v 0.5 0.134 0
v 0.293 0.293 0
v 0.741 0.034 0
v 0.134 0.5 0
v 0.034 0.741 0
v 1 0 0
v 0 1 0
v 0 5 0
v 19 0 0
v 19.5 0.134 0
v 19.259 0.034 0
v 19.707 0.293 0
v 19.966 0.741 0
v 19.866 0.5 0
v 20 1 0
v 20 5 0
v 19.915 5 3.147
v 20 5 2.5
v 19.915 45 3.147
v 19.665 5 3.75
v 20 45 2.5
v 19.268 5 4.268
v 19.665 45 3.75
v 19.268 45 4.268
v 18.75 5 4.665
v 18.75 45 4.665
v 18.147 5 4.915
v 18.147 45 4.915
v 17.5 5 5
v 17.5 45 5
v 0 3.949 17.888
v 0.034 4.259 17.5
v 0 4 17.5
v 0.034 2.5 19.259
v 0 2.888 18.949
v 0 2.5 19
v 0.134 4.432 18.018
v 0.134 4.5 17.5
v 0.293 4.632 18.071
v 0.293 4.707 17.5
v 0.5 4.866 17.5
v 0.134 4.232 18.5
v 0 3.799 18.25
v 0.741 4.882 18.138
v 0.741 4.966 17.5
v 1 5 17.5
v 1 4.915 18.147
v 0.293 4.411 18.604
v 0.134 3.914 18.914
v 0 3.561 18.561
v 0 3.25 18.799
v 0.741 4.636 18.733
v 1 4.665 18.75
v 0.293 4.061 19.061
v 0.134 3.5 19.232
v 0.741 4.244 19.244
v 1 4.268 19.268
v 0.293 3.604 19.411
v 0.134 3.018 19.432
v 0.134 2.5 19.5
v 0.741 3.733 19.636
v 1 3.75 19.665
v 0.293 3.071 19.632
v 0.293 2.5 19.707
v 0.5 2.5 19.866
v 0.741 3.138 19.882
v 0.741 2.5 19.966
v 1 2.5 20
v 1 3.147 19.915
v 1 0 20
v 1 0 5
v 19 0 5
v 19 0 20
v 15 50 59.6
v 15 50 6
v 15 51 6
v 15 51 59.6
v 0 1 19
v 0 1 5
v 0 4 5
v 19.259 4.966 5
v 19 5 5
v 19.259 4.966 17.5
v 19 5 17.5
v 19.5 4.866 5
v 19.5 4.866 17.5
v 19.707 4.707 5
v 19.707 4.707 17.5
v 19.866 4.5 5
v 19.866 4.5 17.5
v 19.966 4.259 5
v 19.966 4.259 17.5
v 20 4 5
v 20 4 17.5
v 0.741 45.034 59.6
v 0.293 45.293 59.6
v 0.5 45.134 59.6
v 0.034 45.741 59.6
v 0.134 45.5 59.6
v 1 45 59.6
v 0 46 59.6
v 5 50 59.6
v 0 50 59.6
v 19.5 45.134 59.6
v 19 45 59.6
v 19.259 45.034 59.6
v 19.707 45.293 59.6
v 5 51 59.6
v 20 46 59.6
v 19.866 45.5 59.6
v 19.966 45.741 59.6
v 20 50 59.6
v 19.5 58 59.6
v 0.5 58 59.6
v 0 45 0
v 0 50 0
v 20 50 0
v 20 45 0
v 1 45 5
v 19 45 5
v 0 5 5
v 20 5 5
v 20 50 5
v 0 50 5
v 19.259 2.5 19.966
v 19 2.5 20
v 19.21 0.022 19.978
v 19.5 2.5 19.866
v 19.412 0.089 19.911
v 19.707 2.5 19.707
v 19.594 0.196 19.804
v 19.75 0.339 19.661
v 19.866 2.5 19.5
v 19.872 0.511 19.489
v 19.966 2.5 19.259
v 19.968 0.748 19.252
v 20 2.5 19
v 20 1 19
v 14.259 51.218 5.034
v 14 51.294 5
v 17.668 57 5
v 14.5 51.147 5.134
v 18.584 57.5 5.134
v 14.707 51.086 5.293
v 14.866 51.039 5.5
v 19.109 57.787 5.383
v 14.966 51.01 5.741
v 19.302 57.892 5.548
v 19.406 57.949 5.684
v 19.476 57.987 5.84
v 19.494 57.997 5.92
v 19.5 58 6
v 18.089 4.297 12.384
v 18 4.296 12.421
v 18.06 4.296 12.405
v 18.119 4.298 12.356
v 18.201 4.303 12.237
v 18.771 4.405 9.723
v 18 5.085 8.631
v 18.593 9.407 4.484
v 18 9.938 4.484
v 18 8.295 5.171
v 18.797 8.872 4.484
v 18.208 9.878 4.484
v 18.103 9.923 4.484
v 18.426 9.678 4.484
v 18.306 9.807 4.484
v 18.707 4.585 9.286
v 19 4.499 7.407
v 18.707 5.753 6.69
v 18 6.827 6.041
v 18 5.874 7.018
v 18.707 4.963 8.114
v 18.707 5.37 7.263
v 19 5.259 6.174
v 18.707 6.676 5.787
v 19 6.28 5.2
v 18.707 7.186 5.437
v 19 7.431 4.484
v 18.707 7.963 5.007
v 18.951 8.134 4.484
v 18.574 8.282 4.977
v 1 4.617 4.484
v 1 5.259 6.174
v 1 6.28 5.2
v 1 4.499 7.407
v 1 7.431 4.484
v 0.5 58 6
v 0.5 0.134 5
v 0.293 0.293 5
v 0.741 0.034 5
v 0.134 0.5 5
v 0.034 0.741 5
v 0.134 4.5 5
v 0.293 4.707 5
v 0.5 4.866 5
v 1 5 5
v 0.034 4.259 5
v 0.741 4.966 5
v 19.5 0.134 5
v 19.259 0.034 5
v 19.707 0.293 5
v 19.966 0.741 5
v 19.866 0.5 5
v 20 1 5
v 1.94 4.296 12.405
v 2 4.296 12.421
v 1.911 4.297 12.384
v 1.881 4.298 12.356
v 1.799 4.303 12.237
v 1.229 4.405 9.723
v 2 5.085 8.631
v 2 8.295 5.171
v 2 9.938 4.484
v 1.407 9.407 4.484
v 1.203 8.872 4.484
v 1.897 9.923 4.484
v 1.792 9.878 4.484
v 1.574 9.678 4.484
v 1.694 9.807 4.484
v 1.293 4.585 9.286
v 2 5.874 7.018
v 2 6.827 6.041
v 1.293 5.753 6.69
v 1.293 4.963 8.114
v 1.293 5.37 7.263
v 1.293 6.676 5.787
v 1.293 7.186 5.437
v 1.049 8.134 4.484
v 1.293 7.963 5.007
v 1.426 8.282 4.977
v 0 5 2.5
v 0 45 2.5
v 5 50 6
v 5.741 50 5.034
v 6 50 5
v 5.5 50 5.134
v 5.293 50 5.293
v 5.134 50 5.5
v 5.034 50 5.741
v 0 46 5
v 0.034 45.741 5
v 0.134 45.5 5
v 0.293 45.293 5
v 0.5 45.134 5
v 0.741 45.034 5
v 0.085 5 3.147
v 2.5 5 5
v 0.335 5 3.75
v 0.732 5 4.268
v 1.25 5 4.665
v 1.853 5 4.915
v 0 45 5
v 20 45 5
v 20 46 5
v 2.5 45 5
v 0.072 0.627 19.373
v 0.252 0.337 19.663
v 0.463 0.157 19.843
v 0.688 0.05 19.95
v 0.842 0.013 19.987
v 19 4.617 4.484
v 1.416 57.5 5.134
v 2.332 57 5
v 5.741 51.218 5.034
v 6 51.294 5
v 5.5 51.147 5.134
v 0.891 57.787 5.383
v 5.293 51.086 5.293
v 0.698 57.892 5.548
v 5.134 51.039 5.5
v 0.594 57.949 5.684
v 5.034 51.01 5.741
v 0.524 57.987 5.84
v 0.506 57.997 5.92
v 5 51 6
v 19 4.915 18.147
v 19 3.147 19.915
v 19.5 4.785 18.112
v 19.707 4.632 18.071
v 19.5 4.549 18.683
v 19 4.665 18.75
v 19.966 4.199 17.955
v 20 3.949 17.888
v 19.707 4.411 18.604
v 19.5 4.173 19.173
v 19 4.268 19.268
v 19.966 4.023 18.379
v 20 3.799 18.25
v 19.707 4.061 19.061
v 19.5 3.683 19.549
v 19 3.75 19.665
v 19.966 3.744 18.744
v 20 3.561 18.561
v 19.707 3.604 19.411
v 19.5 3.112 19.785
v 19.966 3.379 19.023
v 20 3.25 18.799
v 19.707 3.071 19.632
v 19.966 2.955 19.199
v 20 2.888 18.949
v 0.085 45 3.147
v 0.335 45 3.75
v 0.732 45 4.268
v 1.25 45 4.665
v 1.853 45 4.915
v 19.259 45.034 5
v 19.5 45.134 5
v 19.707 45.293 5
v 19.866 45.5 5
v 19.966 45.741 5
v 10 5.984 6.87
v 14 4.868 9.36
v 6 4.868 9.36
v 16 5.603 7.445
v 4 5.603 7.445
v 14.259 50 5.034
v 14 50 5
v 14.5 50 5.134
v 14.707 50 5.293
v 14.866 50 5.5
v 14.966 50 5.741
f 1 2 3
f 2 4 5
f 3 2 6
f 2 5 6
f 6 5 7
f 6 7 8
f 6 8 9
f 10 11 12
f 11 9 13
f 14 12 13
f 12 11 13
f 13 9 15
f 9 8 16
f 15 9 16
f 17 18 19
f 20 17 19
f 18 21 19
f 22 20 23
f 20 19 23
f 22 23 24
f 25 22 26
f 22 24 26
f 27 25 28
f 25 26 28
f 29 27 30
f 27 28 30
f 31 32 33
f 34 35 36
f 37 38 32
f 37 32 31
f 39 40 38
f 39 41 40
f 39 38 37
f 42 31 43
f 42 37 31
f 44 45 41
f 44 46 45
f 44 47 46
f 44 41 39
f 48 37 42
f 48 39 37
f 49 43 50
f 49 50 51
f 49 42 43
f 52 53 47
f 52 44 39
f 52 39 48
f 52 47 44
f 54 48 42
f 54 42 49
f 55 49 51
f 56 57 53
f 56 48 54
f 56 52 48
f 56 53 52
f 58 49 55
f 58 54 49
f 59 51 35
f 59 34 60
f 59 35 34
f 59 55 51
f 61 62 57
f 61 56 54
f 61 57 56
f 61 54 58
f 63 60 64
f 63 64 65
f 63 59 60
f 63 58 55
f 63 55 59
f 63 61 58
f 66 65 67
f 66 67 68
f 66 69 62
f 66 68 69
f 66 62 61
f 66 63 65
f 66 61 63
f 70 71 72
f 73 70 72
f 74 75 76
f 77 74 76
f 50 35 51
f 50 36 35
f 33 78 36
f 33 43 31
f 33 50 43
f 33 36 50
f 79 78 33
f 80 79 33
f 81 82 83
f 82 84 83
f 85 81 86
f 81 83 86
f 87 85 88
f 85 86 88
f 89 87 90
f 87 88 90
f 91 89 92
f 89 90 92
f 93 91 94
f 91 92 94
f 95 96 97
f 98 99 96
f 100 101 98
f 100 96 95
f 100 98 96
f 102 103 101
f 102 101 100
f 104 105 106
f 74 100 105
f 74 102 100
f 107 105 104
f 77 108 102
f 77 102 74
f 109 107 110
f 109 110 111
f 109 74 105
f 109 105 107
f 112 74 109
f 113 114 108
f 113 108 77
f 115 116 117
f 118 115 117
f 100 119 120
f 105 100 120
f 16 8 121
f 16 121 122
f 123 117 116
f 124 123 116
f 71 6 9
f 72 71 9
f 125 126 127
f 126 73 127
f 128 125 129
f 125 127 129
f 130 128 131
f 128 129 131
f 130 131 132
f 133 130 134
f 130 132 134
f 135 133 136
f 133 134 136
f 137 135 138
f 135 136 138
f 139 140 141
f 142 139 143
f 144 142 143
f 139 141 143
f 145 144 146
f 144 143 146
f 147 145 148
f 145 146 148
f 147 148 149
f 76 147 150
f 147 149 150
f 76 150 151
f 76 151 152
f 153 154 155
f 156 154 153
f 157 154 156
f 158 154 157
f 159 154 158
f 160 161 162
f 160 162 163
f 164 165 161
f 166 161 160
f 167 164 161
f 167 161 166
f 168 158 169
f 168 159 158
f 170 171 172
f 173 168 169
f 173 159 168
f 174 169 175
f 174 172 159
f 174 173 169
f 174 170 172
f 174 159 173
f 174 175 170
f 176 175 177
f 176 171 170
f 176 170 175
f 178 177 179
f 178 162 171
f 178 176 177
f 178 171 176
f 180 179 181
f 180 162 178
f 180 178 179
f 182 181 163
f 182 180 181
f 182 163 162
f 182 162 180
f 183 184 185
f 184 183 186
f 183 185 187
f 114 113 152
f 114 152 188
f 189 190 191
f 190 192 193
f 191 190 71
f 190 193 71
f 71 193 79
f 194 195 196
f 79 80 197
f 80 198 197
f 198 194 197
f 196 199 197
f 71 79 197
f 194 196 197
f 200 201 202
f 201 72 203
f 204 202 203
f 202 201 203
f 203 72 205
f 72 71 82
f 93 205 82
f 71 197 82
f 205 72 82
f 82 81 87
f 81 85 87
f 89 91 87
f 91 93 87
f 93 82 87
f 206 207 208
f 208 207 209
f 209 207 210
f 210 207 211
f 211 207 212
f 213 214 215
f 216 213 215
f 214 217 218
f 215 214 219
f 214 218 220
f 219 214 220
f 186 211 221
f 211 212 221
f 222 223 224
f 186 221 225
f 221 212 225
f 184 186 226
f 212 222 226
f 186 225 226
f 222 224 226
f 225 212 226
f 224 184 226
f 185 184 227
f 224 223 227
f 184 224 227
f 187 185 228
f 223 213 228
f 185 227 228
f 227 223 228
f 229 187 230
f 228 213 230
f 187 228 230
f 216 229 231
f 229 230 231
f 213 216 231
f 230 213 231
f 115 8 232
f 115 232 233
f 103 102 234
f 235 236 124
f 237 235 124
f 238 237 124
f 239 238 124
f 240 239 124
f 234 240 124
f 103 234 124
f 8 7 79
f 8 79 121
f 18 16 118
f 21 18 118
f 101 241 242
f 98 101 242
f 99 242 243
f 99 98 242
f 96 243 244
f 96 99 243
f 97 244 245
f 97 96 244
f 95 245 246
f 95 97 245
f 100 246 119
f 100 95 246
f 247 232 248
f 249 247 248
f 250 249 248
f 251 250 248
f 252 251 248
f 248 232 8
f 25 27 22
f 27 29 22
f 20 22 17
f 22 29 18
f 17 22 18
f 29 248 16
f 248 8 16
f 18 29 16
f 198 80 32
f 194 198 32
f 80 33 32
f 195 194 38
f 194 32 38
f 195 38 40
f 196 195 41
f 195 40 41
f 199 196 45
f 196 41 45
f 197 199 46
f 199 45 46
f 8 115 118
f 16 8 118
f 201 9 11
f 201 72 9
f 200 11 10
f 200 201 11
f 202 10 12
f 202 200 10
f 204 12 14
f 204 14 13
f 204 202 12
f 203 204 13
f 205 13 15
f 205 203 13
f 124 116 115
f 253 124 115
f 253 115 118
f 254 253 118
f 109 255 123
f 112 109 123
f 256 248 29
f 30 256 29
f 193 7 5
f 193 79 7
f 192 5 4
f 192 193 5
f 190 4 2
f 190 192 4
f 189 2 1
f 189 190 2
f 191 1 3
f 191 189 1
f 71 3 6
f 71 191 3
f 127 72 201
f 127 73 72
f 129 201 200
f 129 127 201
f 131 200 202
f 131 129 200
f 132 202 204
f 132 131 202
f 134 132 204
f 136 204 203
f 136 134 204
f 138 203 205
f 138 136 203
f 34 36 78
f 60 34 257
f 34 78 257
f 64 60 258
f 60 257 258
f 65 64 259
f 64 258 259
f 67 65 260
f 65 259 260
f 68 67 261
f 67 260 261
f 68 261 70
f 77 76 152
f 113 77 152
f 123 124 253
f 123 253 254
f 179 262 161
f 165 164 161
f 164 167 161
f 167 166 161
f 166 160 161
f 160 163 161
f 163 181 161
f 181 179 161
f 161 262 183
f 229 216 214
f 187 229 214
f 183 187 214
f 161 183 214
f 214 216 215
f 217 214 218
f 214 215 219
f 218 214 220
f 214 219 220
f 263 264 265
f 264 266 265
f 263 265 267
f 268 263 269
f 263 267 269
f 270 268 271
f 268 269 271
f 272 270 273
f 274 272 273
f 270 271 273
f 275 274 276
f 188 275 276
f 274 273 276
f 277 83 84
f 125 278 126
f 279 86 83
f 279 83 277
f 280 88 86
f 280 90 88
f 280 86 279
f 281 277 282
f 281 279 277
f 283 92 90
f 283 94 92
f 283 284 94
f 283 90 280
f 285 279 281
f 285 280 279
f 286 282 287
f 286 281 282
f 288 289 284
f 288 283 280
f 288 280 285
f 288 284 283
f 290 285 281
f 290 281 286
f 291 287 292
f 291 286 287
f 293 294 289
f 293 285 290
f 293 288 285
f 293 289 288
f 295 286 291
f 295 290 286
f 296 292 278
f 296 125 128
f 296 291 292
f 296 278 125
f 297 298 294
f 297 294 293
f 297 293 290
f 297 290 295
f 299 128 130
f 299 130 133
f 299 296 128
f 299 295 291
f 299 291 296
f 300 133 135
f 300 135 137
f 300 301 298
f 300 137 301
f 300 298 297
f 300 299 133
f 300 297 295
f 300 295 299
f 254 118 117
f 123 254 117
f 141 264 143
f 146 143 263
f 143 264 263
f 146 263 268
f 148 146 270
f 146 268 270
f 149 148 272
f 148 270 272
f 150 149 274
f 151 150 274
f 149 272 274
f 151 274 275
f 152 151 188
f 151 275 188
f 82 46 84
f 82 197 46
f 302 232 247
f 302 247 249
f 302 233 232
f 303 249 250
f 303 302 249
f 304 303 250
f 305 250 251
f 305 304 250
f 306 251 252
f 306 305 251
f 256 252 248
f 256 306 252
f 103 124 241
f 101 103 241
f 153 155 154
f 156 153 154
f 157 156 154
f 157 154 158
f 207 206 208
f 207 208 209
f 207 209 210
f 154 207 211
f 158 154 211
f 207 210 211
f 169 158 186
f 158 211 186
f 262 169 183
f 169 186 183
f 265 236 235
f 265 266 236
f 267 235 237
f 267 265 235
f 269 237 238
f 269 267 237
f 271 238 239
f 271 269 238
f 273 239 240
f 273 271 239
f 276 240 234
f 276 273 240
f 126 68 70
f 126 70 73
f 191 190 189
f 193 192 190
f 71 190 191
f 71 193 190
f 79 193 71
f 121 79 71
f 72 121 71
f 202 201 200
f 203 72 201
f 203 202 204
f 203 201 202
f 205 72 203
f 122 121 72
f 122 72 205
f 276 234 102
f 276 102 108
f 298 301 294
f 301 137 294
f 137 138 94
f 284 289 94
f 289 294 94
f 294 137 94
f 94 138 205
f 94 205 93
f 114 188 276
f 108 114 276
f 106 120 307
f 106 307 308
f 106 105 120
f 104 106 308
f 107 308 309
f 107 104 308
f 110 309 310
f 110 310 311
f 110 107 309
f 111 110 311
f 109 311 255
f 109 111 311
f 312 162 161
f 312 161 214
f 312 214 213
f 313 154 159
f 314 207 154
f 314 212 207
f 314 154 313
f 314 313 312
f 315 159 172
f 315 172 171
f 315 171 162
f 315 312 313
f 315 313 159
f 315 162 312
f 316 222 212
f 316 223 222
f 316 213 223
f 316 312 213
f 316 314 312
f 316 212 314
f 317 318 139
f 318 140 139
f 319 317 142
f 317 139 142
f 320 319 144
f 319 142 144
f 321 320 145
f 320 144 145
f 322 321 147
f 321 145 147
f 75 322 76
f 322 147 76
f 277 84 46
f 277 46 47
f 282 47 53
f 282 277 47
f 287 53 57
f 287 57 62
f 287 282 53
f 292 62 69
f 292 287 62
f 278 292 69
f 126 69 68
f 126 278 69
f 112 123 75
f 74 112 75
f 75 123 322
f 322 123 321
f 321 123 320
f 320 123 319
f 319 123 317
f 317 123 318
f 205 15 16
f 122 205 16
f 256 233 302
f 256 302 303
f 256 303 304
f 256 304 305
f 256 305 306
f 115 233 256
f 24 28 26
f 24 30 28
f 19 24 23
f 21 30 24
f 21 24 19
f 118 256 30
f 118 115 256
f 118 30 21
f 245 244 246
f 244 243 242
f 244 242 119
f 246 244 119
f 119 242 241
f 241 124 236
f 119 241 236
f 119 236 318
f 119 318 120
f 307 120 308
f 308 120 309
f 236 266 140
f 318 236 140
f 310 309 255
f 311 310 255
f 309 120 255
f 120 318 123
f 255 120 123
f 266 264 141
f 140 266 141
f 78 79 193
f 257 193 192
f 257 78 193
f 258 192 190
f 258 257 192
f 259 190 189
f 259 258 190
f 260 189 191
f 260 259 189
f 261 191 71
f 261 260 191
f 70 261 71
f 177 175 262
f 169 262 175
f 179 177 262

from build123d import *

# Parameters (mm, degrees)
F1_START = 5
F0_W     = 10
F0_H     = 1
F1_DEPTH = 54.6
F2_START = 5
F2_DEPTH = 54.6
F3_START = 5
F0_W_2   = 20
F0_H_2   = 5
F3_DEPTH = 15
F0_H_3   = 40
F4_DEPTH = 5
F5_DEPTH = 5
F6_R     = 2.5
F6_2_R   = 2.5
F8_START = 1
F8_DEPTH = 18
F9_R     = 1
F9_2_R   = 1
F9_3_R   = 1
F9_4_R   = 1


# Not quite as in the source:
# - two fillets or chamfers of one size are made in one step
# - a feature names something its author has since deleted; it is built from what else it names


with BuildPart() as f1:
    # F0 (on Top) → F1 (new body)
    with BuildSketch(Plane.XY.offset(F1_START)):
        Polygon((0.5, 58), (5, 51), (15, 51), (19.5, 58), align=None)
        with Locations((10, 50.5)):
            Rectangle(F0_W, F0_H)
        Polygon((0, 50), (0, 45), (20, 45), (20, 50), (15, 50), (5, 50), align=None)
    extrude(amount=F1_DEPTH)

    # F0 (on Top) → F2 (join)
    with BuildSketch(Plane.XY.offset(F2_START)):
        Polygon((0, 50), (0, 45), (20, 45), (20, 50), (15, 50), (5, 50), align=None)
    extrude(amount=F2_DEPTH)

    # F9
    f9_edges = [f1.edges().sort_by_distance(p)[0] for p in [
        (0, 45, 32.3),
        (20, 45, 32.3),
        (2.75, 54.5, 5),
        (10, 58, 5),
        (5, 50.5, 5),
        (15, 50.5, 5),
        (17.25, 54.5, 5),
    ]]
    fillet(f9_edges, radius=F9_R)


with BuildPart() as f3:
    # F0 (on Top) → F3 (new body)
    with BuildSketch(Plane.XY.offset(F3_START)):
        with Locations((10, 2.5)):
            Rectangle(F0_W_2, F0_H_2)
    extrude(amount=F3_DEPTH)

    # F6
    f6_edges = [f3.edges().sort_by_distance(p)[0] for p in [
        (10, 5, 20),
    ]]
    fillet(f6_edges, radius=F6_R)

    # F9#2
    f9_2_edges = [f3.edges().sort_by_distance(p)[0] for p in [
        (20, 5, 11.25),
        (0, 5, 11.25),
        (0, 0, 12.5),
        (20, 0, 12.5),
        (0, 4.267767, 19.267767),
        (0, 1.25, 20),
        (20, 4.267767, 19.267767),
        (20, 1.25, 20),
    ]]
    fillet(f9_2_edges, radius=F9_2_R)


with BuildPart() as f4:
    # F0 (on Top) → F4 (new body)
    with BuildSketch(Plane.XY):
        with Locations((10, 25)):
            Rectangle(F0_W_2, F0_H_3)
    extrude(amount=F4_DEPTH)

    # F6#2
    f6_2_edges = [f4.edges().sort_by_distance(p)[0] for p in [
        (20, 25, 5),
        (0, 25, 5),
    ]]
    fillet(f6_2_edges, radius=F6_2_R)


with BuildPart() as f5:
    # F0 (on Top) → F5 (new body)
    with BuildSketch(Plane.XY):
        with Locations((10, 2.5)):
            Rectangle(F0_W_2, F0_H_2)
    extrude(amount=F5_DEPTH)

    # F9#3
    f9_3_edges = [f5.edges().sort_by_distance(p)[0] for p in [
        (20, 0, 2.5),
        (0, 0, 2.5),
    ]]
    fillet(f9_3_edges, radius=F9_3_R)


with BuildPart() as f5b:
    # F0 (on Top) → F5, piece 2 (new body)
    with BuildSketch(Plane.XY):
        Polygon((0, 50), (0, 45), (20, 45), (20, 50), (15, 50), (5, 50), align=None)
    extrude(amount=F5_DEPTH)


with BuildPart() as f8:
    # F7 (on Right) → F8 (new body)
    with BuildSketch(Plane.YZ.offset(F8_START)):
        with BuildLine():
            Line((4.6167019755, 4.4840211049), (9.9377890915, 4.4840211049))
            add(Edge.make_bspline(
                [(4.2957553071, 12.42066134), (4.6167019755, 10.3172202345), (5.2240094479, 6.3370091055), (8.4273385535, 5.0777796032), (9.9377890915, 4.4840211049)],
                knots=[0, 0, 0, 0, 0.5284747561, 1, 1, 1, 1], degree=3))
            Line((4.2957553071, 12.42066134), (4.6167019755, 4.4840211049))
        make_face()
    extrude(amount=F8_DEPTH)

    # F9#4
    f9_4_edges = [f8.edges().sort_by_distance(p)[0] for p in [
        (1, 5.651637, 7.360722),
        (19, 5.651637, 7.360722),
    ]]
    fillet(f9_4_edges, radius=F9_4_R)


solid = Compound([f1.part, f3.part, f4.part, f5.part, f5b.part, f8.part])
